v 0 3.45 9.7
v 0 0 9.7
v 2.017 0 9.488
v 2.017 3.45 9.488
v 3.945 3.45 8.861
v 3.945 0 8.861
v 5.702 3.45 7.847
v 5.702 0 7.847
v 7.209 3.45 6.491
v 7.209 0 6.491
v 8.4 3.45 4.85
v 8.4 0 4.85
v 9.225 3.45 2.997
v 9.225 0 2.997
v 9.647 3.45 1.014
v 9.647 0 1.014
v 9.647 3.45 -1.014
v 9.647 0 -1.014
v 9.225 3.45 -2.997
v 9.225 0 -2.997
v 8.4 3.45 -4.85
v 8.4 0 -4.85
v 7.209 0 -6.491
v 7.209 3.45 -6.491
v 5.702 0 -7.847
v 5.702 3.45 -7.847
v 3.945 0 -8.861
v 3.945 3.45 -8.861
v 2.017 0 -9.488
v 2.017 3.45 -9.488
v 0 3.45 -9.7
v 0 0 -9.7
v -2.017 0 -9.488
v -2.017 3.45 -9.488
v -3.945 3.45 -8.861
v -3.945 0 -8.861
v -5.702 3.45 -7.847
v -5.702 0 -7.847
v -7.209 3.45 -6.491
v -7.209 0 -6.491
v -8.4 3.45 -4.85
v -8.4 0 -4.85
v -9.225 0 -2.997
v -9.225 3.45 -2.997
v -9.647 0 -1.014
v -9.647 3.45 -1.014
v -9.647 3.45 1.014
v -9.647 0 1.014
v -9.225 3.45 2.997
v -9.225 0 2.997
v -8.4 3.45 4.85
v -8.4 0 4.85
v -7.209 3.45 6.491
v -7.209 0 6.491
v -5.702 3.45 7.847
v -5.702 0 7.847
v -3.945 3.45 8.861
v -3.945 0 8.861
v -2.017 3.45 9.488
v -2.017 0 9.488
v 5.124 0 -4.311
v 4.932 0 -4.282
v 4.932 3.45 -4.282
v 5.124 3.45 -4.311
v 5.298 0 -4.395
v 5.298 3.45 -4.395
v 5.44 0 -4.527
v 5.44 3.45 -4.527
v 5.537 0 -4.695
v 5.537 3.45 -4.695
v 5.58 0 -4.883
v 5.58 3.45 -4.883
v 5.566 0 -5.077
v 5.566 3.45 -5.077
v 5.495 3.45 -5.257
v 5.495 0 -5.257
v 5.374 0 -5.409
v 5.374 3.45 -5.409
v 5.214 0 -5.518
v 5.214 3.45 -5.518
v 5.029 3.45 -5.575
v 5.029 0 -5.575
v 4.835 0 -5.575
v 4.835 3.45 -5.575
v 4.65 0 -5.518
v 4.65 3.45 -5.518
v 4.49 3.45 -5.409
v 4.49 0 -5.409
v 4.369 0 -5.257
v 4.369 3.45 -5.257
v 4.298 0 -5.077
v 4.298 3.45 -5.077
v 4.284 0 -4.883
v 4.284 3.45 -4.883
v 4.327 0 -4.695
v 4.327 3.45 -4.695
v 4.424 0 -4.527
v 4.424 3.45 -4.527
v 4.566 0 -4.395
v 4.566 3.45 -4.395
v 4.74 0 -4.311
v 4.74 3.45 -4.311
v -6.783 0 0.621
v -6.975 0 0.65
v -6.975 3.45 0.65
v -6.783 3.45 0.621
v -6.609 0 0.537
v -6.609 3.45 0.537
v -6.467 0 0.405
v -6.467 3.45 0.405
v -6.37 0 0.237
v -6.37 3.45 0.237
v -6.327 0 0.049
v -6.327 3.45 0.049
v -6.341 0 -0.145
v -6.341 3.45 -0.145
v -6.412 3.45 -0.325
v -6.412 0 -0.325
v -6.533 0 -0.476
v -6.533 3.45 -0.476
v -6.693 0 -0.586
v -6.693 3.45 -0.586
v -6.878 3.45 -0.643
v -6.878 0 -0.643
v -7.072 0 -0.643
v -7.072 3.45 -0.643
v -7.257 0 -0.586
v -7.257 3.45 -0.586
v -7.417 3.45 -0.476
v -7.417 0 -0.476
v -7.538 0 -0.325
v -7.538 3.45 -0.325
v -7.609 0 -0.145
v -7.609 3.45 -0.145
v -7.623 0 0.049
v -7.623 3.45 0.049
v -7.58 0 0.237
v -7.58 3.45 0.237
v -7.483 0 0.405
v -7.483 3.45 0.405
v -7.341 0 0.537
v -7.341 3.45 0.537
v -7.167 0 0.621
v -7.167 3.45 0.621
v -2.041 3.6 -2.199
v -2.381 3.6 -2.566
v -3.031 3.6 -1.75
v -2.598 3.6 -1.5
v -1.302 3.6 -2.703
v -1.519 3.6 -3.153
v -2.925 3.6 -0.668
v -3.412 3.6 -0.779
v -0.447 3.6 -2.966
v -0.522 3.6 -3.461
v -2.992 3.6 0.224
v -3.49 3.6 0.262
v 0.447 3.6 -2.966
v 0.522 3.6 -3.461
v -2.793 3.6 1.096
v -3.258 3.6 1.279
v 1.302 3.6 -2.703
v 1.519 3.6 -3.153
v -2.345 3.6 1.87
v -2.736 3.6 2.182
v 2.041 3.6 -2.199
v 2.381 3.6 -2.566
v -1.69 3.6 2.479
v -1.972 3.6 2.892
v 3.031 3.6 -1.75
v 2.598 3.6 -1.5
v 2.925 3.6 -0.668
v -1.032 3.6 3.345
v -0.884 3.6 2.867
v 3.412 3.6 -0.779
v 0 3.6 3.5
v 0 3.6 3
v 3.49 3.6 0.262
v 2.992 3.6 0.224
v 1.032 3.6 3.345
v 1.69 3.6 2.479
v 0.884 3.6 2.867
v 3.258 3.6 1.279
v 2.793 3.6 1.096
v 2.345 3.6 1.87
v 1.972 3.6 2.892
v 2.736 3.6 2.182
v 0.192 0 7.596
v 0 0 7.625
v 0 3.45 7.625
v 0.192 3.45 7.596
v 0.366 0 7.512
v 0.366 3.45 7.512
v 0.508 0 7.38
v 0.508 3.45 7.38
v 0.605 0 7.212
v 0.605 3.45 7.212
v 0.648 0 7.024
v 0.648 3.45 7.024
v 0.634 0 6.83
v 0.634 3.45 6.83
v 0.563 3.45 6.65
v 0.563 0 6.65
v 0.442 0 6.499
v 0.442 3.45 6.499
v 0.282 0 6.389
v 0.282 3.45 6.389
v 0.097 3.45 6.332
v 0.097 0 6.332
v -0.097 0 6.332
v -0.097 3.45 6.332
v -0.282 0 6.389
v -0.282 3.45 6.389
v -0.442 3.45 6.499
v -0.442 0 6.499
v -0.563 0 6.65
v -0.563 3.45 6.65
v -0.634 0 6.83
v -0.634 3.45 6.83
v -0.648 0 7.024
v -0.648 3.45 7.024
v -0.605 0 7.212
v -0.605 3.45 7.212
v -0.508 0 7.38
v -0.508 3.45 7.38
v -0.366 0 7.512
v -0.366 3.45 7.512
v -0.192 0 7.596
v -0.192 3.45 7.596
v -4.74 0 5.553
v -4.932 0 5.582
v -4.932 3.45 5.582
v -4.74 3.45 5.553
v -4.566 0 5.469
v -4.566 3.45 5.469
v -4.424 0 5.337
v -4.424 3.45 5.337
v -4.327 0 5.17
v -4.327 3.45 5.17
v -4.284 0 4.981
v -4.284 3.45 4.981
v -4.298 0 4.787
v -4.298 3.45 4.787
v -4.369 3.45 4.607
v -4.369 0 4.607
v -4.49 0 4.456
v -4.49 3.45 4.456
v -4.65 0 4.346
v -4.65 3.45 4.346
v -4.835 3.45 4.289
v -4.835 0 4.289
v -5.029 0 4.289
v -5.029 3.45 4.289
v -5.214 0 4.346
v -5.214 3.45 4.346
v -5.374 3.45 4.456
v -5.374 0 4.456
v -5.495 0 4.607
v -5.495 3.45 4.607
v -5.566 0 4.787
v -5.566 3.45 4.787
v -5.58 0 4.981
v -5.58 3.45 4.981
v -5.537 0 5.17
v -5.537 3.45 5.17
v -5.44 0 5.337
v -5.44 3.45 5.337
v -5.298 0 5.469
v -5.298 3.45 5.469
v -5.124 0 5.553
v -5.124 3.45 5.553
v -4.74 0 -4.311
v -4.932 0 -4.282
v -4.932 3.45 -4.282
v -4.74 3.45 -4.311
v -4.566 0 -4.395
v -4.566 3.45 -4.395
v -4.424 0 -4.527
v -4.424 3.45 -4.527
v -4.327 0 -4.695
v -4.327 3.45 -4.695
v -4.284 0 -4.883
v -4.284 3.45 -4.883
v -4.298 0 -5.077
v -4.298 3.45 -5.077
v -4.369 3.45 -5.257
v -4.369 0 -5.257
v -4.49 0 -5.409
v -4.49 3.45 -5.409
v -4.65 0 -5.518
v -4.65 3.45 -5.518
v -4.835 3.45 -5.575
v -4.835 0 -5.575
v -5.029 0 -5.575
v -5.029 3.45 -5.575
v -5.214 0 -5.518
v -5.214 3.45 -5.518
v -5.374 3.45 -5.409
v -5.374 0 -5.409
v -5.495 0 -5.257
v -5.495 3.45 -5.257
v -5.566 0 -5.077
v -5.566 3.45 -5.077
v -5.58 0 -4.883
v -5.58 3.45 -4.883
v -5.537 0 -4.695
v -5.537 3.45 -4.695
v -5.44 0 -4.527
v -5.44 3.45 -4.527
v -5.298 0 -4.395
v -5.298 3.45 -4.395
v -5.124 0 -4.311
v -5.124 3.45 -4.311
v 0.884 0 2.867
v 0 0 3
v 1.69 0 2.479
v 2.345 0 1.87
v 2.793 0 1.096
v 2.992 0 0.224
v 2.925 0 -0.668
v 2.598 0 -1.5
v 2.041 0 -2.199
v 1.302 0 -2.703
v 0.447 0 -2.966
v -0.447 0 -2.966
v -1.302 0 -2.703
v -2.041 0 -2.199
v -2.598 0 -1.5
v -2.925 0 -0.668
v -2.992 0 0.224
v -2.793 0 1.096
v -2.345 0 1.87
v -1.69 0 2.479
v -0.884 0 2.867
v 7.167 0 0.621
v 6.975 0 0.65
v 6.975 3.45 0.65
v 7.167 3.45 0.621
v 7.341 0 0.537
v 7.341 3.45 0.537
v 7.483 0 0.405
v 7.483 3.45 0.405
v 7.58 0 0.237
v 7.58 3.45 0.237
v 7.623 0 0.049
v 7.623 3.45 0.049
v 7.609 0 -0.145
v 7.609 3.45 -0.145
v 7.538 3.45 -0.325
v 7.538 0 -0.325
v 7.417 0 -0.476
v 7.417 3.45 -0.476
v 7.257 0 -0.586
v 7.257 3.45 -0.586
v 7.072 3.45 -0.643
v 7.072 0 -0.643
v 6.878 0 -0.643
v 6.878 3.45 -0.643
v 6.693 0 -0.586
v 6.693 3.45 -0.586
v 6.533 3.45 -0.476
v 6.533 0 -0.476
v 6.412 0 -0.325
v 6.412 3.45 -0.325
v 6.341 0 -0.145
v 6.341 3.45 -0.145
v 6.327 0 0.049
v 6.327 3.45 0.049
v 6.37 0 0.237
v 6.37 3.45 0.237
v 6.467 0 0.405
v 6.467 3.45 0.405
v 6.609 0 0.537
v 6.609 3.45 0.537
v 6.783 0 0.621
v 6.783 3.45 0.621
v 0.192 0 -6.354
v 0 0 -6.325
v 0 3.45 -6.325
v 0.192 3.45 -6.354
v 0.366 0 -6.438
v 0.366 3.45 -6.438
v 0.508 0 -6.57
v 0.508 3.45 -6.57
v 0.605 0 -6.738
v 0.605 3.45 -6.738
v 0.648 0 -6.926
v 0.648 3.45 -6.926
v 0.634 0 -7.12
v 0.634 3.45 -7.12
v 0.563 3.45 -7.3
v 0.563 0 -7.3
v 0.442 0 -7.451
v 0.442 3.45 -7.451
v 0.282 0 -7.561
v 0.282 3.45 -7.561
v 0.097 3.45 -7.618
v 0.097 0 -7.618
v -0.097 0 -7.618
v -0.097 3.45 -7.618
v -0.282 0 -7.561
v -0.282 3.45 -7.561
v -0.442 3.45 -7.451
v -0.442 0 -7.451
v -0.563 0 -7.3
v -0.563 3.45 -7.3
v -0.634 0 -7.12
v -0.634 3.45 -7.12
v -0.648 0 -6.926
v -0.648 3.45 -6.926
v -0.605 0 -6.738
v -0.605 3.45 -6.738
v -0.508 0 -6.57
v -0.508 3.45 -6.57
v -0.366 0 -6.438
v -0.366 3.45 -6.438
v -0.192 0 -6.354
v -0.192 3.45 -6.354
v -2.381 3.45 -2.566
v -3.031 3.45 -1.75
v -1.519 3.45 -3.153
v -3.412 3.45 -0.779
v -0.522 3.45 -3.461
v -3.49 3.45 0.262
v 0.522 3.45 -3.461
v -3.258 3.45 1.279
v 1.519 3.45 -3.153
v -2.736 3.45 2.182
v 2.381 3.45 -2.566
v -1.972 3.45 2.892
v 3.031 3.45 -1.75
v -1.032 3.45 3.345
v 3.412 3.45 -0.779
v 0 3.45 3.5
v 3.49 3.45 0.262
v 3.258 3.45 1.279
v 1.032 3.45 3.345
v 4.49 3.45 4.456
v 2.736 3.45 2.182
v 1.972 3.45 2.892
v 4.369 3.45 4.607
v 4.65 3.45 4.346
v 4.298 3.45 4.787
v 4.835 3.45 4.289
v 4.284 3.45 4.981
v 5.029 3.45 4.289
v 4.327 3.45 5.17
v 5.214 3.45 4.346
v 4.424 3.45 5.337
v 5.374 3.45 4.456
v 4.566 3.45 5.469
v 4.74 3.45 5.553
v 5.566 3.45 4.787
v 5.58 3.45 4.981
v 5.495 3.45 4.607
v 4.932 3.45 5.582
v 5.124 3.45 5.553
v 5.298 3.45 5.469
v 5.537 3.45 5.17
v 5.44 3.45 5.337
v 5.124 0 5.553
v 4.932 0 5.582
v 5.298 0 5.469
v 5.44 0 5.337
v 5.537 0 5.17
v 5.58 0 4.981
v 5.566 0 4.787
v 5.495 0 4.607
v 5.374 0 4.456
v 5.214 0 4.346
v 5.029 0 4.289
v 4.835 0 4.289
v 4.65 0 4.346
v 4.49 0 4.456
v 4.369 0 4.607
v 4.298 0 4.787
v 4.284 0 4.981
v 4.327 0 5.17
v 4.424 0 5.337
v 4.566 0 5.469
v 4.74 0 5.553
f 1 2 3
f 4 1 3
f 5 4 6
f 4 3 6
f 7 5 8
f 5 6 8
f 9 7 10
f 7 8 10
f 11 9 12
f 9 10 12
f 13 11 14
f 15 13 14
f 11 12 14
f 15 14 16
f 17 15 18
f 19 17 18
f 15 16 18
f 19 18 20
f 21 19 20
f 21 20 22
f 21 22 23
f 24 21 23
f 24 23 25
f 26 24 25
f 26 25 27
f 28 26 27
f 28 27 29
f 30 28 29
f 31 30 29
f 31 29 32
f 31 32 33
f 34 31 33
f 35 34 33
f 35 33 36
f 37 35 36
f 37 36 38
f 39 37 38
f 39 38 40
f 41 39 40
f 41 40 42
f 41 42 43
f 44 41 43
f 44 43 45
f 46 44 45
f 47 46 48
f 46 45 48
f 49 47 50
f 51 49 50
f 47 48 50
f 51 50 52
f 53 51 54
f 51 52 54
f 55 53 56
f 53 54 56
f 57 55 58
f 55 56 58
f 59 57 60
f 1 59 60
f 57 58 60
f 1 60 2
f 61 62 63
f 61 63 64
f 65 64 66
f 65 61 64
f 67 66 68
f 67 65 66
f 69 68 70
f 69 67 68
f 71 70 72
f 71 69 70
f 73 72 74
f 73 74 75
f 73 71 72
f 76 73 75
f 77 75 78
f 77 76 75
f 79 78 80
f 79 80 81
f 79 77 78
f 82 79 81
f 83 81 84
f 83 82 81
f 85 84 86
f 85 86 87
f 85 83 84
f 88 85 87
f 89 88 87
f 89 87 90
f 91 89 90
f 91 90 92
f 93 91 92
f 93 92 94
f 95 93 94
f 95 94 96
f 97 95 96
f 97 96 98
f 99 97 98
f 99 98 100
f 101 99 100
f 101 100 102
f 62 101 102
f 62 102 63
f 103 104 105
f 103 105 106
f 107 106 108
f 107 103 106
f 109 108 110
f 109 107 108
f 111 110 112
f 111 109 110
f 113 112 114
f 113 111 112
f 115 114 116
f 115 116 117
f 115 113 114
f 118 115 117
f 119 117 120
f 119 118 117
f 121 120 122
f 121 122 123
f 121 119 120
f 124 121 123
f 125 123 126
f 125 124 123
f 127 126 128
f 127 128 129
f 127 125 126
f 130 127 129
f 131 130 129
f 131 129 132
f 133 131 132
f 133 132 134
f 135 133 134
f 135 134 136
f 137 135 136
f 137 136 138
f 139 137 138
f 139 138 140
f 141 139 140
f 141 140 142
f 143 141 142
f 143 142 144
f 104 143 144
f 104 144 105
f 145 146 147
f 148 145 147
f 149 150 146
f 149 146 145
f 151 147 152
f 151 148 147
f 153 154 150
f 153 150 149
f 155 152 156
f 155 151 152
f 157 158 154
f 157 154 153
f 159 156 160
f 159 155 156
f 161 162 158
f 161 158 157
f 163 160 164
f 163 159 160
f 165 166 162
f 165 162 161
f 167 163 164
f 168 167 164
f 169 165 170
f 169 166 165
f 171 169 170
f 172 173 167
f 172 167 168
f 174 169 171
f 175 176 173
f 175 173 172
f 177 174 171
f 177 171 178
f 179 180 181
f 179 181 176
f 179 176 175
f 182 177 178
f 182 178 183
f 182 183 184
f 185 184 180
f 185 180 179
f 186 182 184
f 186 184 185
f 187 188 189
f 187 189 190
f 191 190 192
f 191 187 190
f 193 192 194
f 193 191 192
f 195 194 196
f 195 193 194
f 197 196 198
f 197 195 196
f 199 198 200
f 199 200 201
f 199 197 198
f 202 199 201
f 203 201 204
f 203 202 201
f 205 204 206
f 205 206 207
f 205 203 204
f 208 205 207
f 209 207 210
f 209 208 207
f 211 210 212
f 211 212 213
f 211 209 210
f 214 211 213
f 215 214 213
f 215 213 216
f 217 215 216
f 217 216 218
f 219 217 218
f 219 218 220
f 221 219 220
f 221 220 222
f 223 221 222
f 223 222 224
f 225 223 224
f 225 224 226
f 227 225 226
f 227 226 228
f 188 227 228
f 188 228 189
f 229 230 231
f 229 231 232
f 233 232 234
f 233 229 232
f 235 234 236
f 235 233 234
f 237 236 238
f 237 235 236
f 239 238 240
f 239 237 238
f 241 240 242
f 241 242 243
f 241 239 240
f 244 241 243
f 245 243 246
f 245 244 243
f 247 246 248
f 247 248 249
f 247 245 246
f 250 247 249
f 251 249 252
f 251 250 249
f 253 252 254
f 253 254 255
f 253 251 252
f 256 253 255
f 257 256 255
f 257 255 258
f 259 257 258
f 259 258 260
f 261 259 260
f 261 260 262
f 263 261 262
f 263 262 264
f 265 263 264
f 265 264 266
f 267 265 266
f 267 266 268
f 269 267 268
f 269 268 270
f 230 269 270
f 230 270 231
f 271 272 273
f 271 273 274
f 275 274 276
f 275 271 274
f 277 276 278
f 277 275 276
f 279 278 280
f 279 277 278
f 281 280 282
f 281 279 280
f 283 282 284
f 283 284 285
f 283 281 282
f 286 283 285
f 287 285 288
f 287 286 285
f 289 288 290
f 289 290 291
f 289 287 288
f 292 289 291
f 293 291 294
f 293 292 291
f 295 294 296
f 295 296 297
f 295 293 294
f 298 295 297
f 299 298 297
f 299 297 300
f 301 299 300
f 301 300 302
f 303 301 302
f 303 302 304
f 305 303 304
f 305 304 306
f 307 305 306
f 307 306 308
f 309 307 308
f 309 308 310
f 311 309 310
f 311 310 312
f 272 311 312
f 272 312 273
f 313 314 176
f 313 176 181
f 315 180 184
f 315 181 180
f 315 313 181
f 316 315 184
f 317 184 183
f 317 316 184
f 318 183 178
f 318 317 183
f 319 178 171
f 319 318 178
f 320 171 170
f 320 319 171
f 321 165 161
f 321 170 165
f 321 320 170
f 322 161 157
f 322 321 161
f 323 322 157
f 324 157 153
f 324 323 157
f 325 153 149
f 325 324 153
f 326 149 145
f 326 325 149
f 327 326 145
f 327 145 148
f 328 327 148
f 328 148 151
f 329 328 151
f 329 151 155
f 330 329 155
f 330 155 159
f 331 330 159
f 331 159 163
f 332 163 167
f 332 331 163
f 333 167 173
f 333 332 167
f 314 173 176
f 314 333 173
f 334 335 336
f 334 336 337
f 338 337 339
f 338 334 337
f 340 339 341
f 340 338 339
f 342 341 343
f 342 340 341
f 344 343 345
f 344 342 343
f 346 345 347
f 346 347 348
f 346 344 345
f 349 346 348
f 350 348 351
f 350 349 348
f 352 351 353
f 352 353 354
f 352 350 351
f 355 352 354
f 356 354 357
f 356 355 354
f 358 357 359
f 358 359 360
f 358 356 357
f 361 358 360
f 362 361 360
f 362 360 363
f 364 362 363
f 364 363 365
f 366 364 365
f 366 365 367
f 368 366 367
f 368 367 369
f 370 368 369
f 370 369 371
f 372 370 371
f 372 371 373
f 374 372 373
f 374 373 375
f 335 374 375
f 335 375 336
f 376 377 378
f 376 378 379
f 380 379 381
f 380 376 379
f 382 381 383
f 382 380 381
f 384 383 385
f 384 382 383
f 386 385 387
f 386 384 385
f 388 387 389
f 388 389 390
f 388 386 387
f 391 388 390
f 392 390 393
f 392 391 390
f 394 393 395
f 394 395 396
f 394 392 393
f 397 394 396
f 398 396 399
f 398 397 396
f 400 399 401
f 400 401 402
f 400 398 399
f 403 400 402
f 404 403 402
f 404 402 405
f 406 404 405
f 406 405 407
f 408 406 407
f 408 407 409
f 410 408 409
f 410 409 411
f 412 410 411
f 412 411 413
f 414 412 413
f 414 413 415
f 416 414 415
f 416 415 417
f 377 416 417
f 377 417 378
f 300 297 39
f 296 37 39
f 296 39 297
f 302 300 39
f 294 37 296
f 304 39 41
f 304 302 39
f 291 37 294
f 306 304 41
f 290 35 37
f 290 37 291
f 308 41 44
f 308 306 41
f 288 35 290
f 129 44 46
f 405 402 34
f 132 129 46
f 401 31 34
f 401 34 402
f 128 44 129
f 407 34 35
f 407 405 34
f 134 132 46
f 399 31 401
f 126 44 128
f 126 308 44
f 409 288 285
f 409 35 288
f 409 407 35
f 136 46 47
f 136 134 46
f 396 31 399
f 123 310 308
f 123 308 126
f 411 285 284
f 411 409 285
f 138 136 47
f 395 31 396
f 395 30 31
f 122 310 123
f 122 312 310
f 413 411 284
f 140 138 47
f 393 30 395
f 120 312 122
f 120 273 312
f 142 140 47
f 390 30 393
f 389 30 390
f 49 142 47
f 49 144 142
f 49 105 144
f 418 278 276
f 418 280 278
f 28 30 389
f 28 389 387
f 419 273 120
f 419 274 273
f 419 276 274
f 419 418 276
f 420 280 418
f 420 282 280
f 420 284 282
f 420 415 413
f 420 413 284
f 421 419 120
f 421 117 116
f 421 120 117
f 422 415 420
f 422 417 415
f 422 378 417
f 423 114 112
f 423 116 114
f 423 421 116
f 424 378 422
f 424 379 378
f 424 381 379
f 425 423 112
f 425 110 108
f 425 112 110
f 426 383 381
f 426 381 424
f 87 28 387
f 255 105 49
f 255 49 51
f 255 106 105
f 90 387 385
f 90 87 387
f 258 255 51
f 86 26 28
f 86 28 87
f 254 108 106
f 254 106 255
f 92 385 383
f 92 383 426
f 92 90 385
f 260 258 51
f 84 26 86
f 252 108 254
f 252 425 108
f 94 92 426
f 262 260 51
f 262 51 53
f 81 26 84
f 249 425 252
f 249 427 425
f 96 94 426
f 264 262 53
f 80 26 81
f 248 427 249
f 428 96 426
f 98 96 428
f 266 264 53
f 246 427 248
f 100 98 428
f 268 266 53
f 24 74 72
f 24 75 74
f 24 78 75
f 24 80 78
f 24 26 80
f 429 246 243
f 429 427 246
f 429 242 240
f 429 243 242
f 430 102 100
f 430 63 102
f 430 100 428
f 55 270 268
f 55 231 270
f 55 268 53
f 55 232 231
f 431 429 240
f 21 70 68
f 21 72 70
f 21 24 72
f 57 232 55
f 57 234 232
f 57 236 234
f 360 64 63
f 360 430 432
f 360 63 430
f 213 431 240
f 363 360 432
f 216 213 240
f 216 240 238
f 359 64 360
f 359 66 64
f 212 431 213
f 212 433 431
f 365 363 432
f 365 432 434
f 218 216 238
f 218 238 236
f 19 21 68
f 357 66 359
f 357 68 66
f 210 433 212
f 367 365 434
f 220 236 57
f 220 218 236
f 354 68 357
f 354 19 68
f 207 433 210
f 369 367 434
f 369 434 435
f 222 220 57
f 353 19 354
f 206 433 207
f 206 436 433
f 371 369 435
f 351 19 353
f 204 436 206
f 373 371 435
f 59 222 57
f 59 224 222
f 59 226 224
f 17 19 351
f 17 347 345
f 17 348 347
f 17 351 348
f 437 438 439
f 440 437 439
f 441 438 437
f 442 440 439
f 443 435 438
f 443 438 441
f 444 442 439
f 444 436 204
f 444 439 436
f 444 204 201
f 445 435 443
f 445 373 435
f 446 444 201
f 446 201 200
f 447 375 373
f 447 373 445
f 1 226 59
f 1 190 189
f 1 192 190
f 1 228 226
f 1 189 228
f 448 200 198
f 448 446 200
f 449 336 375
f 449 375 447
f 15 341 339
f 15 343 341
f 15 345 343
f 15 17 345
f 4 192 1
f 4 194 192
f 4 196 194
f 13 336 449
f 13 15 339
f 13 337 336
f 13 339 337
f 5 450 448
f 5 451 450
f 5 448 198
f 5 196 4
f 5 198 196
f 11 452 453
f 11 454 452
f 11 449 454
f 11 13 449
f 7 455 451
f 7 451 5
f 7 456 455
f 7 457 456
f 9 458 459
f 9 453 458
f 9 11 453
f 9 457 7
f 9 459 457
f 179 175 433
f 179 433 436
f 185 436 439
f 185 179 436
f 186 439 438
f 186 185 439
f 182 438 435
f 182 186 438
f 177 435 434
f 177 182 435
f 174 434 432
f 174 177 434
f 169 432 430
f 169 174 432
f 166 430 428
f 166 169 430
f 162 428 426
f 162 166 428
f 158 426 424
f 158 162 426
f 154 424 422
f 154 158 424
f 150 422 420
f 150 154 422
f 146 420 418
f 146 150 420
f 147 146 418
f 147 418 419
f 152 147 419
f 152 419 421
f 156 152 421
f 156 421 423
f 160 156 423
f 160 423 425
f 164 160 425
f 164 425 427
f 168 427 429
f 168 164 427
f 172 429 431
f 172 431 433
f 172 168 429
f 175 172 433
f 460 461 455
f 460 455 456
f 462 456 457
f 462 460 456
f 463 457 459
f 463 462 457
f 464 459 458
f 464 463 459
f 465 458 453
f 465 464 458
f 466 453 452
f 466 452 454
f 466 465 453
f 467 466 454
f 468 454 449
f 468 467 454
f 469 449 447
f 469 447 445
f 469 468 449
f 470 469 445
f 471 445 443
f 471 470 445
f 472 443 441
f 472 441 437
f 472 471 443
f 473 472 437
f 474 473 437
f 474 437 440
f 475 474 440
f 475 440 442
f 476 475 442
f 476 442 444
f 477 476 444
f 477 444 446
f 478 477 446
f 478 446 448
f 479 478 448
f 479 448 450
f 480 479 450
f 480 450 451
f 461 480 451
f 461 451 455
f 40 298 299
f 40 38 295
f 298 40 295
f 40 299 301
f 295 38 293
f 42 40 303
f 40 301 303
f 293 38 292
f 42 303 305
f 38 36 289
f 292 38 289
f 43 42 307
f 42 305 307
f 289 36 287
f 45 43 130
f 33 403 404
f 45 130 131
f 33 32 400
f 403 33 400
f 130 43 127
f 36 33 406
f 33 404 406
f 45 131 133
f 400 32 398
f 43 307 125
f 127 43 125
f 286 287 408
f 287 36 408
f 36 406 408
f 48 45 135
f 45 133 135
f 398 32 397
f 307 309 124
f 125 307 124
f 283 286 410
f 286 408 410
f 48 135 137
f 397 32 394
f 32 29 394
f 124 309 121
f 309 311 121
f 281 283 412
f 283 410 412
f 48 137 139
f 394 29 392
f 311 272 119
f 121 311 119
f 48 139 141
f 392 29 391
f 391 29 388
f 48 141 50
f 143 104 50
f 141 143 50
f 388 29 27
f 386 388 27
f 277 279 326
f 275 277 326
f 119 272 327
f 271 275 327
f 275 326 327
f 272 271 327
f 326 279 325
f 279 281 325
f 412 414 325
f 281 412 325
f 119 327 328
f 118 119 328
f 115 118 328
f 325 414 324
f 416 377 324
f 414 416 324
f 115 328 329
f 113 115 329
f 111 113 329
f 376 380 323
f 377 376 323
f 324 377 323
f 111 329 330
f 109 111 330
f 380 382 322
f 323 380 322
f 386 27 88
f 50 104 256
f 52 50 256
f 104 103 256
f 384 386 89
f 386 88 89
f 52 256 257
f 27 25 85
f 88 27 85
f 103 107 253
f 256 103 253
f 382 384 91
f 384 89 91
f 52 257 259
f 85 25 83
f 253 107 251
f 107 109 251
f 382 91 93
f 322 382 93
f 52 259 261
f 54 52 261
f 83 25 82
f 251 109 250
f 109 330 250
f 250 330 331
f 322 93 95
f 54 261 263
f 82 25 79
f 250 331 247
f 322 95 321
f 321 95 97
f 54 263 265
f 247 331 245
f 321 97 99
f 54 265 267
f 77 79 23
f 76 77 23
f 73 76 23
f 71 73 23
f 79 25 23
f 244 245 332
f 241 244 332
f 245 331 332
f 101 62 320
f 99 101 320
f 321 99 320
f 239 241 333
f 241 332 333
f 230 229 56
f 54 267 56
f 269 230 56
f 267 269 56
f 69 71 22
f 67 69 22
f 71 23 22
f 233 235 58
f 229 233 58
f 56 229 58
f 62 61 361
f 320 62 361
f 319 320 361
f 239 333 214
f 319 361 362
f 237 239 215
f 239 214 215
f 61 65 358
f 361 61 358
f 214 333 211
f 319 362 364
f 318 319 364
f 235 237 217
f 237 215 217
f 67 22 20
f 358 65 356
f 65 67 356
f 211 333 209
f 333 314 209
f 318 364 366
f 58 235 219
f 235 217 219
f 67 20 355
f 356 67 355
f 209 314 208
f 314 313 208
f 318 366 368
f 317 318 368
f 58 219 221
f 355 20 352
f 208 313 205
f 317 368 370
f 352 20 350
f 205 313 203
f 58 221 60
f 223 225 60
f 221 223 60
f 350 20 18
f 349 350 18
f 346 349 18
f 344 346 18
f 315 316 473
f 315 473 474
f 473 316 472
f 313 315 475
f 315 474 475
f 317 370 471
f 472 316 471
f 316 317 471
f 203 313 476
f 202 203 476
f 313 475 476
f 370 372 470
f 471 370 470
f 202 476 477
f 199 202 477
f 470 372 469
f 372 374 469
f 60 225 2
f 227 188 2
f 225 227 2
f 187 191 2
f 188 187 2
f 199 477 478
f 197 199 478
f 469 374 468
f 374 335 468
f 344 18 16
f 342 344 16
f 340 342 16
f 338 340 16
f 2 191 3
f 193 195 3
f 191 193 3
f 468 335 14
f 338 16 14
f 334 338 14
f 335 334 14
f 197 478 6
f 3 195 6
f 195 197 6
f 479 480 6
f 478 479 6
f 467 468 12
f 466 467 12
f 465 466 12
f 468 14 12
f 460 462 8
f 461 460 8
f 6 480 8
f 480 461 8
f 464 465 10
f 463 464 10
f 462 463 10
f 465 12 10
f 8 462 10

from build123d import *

# Parameters (mm, degrees)
SKETCH1_R               = 9.7
BOSS_EXTRUDE1_DEPTH     = 3.6
CUT_EXTRUDE1_DEPTH      = 15.182383439
CUT_EXTRUDE1_DEPTH_BACK = 15.182383439
SKETCH2_R               = 0.65
CUT_EXTRUDE2_DEPTH      = 15.182383439
CUT_EXTRUDE2_DEPTH_BACK = 15.182383439
SKETCH3_R               = 3
SKETCH4_R               = 9.7
SKETCH4_R_2             = 3.5
SKETCH4_R_3             = 0.65
CUT_EXTRUDE3_DEPTH      = 0.15


with BuildPart() as part:
    # Sketch1 → Boss-Extrude1 (new body)
    with BuildSketch(Plane(origin=(0, 0, 0), x_dir=(1, 0, 0), z_dir=(0, 1, 0))):
        with Locations(Location((0, 0, 0), (0, 0, 270))):
            Circle(SKETCH1_R)
    extrude(amount=BOSS_EXTRUDE1_DEPTH)

    # Sketch2 → Cut-Extrude1 (cut, two sides: drawn at the far end of the back side and taken through both)
    with BuildSketch(Plane(origin=(0, 3.6, 0), x_dir=(1, 0, 0), z_dir=(0, 1, 0)).offset(-CUT_EXTRUDE1_DEPTH_BACK)):
        with Locations(Location((-6.975, 0, 0), (0, 0, 270))):
            Circle(SKETCH2_R)
        with Locations(Location((-4.932069799, 4.932069799, 0), (0, 0, 270))):
            Circle(SKETCH2_R)
        with Locations(Location((0, 6.975, 0), (0, 0, 270))):
            Circle(SKETCH2_R)
        with Locations(Location((4.932069799, 4.932069799, 0), (0, 0, 270))):
            Circle(SKETCH2_R)
        with Locations(Location((6.975, 0, 0), (0, 0, 270))):
            Circle(SKETCH2_R)
        with Locations(Location((4.932069799, -4.932069799, 0), (0, 0, 270))):
            Circle(SKETCH2_R)
        with Locations(Location((0, -6.975, 0), (0, 0, 270))):
            Circle(SKETCH2_R)
        with Locations(Location((-4.932069799, -4.932069799, 0), (0, 0, 270))):
            Circle(SKETCH2_R)
    extrude(amount=CUT_EXTRUDE1_DEPTH + CUT_EXTRUDE1_DEPTH_BACK, mode=Mode.SUBTRACT)

    # Sketch3 → Cut-Extrude2 (cut, two sides: drawn at the far end of the back side and taken through both)
    with BuildSketch(Plane(origin=(0, 3.6, 0), x_dir=(1, 0, 0), z_dir=(0, 1, 0)).offset(-CUT_EXTRUDE2_DEPTH_BACK)):
        with Locations(Location((0, 0, 0), (0, 0, 270))):
            Circle(SKETCH3_R)
    extrude(amount=CUT_EXTRUDE2_DEPTH + CUT_EXTRUDE2_DEPTH_BACK, mode=Mode.SUBTRACT)

    # Sketch4 → Cut-Extrude3 (cut)
    with BuildSketch(Plane(origin=(0, 3.6, 0), x_dir=(1, 0, 0), z_dir=(0, 1, 0))):
        with Locations(Location((0, 0, 0), (0, 0, 270))):
            Circle(SKETCH4_R)
        with Locations(Location((0, 0, 0), (0, 0, 270))):
            Circle(SKETCH4_R_2, mode=Mode.SUBTRACT)
        with Locations(Location((-6.975, 0, 0), (0, 0, 270))):
            Circle(SKETCH4_R_3, mode=Mode.SUBTRACT)
        with Locations(Location((0, 6.975, 0), (0, 0, 270))):
            Circle(SKETCH4_R_3, mode=Mode.SUBTRACT)
        with Locations(Location((6.975, 0, 0), (0, 0, 270))):
            Circle(SKETCH4_R_3, mode=Mode.SUBTRACT)
        with Locations(Location((0, -6.975, 0), (0, 0, 270))):
            Circle(SKETCH4_R_3, mode=Mode.SUBTRACT)
        with Locations(Location((-4.932069799, -4.932069799, 0), (0, 0, 270))):
            Circle(SKETCH4_R_3, mode=Mode.SUBTRACT)
        with Locations(Location((4.932069799, -4.932069799, 0), (0, 0, 270))):
            Circle(SKETCH4_R_3, mode=Mode.SUBTRACT)
        with Locations(Location((4.932069799, 4.932069799, 0), (0, 0, 270))):
            Circle(SKETCH4_R_3, mode=Mode.SUBTRACT)
        with Locations(Location((-4.932069799, 4.932069799, 0), (0, 0, 270))):
            Circle(SKETCH4_R_3, mode=Mode.SUBTRACT)
    extrude(amount=-CUT_EXTRUDE3_DEPTH, mode=Mode.SUBTRACT)


solid = part.part
